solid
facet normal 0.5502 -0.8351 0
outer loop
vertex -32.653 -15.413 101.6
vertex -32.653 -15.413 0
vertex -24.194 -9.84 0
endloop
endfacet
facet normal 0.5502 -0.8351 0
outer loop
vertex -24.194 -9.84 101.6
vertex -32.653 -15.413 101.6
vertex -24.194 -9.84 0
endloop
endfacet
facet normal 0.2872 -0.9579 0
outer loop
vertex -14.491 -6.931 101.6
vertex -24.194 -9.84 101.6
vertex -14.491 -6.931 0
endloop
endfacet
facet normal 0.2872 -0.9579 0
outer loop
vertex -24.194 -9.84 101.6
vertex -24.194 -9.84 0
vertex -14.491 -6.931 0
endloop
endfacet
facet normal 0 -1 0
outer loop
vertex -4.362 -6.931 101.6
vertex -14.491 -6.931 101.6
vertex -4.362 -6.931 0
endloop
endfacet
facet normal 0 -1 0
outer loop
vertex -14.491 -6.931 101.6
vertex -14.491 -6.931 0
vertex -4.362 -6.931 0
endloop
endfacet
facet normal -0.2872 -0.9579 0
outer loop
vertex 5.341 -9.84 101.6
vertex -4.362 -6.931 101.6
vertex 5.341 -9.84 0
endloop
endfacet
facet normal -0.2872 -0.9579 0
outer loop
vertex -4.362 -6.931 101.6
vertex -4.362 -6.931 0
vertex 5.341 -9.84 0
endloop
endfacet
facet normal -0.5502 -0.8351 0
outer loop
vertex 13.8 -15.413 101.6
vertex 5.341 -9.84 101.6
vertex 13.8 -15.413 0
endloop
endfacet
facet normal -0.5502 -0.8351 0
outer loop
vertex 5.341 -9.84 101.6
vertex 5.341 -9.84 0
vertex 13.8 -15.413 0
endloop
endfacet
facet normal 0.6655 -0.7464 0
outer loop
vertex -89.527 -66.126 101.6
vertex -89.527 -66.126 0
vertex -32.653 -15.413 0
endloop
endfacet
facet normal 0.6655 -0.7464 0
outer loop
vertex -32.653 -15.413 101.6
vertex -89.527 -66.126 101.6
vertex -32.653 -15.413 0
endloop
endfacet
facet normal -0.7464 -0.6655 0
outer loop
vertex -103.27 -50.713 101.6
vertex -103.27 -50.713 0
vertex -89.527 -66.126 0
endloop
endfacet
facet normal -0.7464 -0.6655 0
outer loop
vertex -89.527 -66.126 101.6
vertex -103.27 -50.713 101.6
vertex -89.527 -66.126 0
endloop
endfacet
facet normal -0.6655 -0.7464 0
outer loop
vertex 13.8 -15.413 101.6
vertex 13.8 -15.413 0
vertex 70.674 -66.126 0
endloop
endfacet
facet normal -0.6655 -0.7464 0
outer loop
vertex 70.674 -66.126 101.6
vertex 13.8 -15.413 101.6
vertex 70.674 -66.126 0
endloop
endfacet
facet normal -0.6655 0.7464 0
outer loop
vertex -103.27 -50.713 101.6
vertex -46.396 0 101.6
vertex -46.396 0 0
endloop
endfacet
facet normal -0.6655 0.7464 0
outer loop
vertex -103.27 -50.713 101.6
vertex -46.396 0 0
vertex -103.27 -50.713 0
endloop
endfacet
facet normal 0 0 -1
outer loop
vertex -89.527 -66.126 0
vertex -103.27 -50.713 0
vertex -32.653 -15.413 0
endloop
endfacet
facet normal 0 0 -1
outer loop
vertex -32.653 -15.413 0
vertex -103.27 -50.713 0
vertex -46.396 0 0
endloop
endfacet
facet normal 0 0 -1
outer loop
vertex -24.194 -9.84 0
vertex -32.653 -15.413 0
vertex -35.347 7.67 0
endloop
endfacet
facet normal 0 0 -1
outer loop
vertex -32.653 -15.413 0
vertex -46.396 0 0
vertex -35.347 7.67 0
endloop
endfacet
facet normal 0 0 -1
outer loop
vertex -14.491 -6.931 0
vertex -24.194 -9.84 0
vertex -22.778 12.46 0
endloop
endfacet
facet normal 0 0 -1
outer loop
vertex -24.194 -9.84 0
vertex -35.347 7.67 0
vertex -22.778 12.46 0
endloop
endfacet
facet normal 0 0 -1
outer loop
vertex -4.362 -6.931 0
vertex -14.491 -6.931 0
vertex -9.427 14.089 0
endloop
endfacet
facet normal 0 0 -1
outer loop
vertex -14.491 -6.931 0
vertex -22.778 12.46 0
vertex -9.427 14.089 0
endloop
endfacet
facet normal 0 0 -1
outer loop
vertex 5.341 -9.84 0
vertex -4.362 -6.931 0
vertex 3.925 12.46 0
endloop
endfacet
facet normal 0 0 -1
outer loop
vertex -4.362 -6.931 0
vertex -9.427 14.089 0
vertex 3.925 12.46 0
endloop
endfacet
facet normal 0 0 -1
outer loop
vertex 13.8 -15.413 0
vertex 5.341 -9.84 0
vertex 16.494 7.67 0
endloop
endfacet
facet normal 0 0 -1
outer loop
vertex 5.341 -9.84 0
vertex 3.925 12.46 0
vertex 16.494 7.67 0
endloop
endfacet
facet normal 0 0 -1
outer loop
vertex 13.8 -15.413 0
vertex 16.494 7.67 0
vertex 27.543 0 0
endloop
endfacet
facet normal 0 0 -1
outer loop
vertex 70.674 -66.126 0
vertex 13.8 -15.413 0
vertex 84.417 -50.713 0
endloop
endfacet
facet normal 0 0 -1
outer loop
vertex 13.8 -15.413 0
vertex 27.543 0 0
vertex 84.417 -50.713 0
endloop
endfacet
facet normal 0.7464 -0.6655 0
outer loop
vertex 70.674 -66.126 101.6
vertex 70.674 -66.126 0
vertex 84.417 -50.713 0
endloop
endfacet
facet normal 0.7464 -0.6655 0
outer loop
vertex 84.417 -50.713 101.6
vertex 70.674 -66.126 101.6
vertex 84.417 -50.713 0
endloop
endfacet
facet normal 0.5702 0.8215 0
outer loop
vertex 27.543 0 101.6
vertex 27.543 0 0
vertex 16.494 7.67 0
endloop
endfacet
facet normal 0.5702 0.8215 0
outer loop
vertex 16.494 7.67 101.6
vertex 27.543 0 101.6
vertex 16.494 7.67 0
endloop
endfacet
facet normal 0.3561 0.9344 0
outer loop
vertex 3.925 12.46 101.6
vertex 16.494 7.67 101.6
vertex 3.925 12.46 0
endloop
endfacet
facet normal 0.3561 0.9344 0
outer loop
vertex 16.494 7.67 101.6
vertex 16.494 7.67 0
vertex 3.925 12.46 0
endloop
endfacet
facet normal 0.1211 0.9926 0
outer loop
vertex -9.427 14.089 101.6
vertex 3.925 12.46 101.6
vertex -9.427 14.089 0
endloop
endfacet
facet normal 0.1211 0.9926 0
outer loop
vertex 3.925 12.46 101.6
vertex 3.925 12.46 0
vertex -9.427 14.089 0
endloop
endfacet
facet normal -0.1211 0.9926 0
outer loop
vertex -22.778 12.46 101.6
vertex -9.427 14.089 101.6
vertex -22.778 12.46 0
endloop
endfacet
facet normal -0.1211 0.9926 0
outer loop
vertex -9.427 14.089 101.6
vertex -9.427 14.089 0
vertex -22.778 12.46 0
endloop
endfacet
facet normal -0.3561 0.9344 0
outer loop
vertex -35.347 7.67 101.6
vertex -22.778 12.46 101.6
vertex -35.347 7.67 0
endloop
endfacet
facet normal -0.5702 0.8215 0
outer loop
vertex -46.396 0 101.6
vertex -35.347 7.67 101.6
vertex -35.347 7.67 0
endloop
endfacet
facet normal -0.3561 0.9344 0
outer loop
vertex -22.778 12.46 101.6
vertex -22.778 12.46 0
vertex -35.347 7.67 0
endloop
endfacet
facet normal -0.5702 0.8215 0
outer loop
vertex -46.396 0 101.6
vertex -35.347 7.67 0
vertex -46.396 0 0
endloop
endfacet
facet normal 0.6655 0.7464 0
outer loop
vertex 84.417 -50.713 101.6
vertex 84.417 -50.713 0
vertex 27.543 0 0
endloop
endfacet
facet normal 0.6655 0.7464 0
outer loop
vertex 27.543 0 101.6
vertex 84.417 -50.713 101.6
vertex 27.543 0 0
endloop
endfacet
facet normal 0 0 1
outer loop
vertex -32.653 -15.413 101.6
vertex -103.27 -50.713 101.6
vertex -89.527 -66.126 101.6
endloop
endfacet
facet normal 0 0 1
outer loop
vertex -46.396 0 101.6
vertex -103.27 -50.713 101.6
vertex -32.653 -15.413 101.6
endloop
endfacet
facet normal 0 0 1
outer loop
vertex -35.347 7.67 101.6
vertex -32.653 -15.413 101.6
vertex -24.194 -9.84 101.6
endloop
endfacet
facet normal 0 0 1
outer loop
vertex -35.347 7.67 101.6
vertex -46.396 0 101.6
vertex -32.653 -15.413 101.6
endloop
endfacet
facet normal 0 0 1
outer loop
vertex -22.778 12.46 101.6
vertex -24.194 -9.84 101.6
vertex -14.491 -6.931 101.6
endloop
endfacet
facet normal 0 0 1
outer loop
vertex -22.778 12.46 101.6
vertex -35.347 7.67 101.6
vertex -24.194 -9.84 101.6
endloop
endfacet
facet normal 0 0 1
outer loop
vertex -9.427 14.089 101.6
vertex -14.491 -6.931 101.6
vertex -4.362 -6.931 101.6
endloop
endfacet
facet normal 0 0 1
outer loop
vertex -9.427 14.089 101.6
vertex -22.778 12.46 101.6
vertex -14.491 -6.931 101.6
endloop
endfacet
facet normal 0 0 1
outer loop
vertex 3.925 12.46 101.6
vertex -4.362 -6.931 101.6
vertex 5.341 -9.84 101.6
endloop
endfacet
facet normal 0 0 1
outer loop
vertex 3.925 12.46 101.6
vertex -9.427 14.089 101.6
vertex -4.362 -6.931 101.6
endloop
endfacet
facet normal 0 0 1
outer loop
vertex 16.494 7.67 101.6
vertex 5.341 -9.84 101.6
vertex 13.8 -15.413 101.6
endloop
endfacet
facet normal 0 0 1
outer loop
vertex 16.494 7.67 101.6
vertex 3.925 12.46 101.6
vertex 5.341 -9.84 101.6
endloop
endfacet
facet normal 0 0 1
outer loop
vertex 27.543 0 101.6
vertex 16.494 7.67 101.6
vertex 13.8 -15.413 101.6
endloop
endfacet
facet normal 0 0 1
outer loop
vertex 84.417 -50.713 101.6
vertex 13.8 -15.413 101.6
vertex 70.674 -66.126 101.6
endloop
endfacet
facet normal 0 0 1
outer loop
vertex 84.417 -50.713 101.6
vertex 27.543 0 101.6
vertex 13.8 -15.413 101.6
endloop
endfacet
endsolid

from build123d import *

# Parameters (mm, degrees)
F1_DEPTH = 101.6


with BuildPart() as f1:
    # F0 (on Top) → F1 (new body)
    with BuildSketch(Plane.XY):
        with BuildLine():
            ThreePointArc((27.543169, 0), (-9.426531, 14.088715), (-46.396231, 0))
            Line((-46.396231, 0), (27.543169, 0))
        make_face()
        with BuildLine():
            Line((27.543169, 0), (-46.396231, 0))
            Line((-46.396231, 0), (-103.270147, -50.712894))
            Line((-103.270147, -50.712894), (-89.526953, -66.125726))
            Line((-89.526953, -66.125726), (-32.653037, -15.412831))
            ThreePointArc((-32.653037, -15.412831), (-9.426531, -6.561485), (13.799974, -15.412831))
            Line((13.799974, -15.412831), (70.673891, -66.125726))
            Line((70.673891, -66.125726), (84.417085, -50.712894))
            Line((84.417085, -50.712894), (27.543169, 0))
        make_face()
    extrude(amount=F1_DEPTH)


solid = f1.part
